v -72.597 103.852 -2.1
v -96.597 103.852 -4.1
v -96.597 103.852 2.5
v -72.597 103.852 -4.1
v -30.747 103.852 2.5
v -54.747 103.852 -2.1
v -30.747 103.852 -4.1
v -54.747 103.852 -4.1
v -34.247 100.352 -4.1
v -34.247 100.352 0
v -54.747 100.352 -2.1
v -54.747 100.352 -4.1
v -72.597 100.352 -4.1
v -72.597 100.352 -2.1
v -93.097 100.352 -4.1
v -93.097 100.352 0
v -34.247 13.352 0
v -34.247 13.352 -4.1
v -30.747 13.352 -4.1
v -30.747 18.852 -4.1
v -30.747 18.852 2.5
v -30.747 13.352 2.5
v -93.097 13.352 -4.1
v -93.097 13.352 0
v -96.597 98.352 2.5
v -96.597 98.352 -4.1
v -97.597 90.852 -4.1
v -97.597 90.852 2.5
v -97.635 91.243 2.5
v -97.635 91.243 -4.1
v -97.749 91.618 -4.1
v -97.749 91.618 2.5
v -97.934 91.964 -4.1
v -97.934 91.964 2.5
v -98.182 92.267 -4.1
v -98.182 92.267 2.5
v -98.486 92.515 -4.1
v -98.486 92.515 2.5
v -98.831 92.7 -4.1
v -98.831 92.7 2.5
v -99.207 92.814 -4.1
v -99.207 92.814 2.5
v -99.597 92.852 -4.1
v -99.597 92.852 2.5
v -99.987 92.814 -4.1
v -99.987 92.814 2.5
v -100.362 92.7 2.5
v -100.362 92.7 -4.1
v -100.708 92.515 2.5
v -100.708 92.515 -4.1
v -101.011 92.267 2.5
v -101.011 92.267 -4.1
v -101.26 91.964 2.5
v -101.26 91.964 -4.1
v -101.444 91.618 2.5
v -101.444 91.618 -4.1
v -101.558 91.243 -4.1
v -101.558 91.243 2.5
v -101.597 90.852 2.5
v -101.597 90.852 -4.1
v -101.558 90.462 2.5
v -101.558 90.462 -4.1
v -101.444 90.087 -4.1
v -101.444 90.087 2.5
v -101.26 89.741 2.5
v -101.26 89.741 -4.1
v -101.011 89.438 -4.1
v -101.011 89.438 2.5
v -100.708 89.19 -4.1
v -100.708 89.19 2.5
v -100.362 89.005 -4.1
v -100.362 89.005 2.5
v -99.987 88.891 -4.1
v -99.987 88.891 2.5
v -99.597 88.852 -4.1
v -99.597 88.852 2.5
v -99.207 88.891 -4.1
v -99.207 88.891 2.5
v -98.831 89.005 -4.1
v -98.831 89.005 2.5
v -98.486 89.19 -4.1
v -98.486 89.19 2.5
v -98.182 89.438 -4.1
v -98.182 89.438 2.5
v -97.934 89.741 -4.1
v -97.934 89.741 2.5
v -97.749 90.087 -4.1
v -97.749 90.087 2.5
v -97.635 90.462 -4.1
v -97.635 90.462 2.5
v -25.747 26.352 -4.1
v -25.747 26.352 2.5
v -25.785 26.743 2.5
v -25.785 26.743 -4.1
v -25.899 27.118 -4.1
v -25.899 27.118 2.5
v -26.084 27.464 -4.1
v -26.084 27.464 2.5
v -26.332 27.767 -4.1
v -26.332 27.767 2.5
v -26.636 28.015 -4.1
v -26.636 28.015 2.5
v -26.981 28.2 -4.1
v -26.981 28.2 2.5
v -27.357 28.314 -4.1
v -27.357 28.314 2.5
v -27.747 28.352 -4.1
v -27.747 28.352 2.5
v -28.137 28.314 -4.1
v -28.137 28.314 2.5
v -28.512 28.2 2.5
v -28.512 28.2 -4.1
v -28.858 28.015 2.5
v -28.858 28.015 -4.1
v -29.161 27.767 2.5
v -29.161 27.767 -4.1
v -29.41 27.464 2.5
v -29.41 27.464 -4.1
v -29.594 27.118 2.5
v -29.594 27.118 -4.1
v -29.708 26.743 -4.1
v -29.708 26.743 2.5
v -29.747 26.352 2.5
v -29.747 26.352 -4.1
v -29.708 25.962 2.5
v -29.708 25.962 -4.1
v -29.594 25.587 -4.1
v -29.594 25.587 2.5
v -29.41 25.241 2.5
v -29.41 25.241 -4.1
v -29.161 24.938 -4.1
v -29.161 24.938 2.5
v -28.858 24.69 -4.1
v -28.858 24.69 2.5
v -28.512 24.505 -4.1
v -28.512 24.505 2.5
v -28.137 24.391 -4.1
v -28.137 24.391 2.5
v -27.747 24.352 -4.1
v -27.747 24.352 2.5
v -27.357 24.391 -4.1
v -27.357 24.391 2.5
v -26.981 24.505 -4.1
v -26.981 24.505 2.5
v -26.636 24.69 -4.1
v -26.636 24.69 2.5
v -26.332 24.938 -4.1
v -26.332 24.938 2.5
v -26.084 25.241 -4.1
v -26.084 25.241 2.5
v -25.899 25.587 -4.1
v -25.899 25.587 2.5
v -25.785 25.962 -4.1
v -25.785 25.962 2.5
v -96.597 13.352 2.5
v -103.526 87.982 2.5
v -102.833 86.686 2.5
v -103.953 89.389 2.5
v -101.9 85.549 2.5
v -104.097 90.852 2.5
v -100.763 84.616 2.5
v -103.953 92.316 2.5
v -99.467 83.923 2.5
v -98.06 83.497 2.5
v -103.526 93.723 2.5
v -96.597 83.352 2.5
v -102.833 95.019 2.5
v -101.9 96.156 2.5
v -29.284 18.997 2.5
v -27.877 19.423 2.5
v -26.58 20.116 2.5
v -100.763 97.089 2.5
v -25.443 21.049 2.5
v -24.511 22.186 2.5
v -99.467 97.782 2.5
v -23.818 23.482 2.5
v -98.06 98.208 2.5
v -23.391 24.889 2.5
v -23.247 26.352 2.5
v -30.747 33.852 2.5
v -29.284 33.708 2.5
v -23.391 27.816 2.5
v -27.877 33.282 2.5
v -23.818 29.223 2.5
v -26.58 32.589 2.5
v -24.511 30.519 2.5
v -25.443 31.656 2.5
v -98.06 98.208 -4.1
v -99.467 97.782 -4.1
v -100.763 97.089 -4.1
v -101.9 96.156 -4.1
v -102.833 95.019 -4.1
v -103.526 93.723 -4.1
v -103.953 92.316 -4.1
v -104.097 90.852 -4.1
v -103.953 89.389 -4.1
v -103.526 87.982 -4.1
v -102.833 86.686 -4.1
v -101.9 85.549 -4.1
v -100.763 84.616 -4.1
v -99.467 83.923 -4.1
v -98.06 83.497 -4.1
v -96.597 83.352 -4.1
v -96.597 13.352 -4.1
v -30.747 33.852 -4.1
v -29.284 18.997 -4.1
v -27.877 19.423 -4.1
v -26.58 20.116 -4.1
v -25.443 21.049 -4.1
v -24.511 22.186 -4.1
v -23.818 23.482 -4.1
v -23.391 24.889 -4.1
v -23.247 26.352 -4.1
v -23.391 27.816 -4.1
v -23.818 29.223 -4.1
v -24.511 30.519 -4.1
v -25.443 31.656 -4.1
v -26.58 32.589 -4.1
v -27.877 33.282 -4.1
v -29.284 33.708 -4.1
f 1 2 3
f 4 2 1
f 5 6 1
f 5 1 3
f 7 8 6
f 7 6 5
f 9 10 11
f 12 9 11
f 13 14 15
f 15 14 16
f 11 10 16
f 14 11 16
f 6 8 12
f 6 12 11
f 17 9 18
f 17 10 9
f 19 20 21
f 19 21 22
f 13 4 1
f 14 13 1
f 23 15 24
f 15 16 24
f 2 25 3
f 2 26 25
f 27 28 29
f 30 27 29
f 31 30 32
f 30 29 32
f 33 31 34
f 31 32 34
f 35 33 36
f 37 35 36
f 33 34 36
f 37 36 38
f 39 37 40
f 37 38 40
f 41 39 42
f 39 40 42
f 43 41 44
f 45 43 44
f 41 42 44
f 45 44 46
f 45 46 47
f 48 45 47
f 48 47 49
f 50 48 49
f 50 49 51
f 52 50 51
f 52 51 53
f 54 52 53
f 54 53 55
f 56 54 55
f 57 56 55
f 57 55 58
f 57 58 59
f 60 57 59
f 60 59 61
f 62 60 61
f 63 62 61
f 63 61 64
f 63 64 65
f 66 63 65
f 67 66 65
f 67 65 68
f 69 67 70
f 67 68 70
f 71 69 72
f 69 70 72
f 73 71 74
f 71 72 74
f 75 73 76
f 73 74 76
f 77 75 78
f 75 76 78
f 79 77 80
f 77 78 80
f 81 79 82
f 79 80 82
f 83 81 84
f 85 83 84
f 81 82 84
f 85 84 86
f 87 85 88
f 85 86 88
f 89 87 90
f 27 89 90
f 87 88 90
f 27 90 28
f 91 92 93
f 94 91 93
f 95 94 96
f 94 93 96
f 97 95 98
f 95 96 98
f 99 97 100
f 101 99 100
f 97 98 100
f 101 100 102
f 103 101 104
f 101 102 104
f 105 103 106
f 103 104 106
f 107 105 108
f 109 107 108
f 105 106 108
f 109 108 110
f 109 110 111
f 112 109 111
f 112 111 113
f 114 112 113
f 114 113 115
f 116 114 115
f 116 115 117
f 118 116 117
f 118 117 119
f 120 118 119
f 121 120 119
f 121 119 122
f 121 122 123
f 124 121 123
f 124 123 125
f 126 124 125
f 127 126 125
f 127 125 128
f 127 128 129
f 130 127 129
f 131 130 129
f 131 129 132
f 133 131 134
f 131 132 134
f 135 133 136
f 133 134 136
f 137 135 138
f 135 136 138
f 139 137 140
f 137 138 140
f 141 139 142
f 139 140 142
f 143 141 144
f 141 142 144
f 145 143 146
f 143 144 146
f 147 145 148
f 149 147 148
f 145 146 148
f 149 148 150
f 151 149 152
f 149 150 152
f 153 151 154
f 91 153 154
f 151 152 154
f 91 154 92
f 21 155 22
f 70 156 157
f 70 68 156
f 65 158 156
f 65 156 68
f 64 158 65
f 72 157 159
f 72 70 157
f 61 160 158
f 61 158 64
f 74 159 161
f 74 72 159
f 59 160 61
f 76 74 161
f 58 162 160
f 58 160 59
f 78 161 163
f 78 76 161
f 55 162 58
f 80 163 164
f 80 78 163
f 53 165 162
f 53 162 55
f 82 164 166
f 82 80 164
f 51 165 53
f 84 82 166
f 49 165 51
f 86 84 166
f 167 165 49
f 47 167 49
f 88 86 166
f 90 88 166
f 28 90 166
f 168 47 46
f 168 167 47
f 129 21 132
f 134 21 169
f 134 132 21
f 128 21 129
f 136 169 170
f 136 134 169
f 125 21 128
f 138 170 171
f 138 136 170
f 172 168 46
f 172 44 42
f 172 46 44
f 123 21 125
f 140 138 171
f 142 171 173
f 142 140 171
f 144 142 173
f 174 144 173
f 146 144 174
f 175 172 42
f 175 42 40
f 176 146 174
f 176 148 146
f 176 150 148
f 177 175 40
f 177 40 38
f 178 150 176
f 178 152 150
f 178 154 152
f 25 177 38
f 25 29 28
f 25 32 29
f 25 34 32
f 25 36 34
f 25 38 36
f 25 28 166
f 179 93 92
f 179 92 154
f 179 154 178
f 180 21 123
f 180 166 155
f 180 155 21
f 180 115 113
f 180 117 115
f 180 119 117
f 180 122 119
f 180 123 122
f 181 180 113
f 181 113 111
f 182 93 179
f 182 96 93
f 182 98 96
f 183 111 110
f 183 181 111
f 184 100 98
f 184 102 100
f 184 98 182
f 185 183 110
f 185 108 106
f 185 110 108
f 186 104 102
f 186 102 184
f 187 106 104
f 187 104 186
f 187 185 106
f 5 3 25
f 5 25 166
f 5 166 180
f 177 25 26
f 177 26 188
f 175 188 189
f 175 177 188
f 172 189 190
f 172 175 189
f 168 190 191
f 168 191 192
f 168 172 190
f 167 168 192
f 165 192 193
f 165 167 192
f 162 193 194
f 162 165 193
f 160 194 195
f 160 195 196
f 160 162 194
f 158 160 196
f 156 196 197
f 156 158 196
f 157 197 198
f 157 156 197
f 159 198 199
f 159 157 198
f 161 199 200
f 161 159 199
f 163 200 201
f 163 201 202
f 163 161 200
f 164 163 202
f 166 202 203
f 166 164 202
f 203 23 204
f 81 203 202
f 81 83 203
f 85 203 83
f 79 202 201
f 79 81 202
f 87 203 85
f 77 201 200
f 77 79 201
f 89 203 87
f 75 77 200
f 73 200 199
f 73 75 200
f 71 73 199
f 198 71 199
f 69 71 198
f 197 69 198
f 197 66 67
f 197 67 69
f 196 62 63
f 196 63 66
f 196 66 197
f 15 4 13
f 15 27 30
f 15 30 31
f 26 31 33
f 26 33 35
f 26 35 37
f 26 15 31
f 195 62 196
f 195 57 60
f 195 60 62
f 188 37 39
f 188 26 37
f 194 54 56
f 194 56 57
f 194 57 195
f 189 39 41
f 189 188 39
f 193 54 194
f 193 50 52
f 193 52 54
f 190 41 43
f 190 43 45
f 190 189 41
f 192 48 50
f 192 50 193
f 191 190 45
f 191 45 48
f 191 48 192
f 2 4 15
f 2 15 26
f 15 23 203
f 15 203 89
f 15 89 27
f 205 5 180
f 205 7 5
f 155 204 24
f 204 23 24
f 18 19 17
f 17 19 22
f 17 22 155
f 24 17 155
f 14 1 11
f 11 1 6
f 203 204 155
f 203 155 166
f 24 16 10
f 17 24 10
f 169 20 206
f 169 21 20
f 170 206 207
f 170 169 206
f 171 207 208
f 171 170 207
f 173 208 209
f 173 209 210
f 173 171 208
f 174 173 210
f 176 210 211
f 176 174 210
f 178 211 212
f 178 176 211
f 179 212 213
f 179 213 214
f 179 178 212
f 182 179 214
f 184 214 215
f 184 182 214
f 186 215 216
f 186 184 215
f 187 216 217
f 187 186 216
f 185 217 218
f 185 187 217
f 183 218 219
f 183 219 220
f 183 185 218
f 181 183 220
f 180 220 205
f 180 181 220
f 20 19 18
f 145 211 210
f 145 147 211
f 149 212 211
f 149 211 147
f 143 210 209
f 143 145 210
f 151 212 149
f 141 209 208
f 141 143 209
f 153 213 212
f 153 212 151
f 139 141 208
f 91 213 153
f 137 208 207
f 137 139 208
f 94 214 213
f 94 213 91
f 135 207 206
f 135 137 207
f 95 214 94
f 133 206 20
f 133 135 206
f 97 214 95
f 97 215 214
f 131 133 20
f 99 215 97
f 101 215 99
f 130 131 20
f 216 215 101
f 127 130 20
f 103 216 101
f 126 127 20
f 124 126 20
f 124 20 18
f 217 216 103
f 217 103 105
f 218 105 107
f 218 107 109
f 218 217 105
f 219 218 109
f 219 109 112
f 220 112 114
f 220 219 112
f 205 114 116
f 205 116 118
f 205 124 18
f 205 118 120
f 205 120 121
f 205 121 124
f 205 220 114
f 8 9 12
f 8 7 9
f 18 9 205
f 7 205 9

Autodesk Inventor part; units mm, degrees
ref_plane "YZ Plane" through (0, 0, 0) normal (1, 0, 0) x (0, 1, 0)
ref_plane "XZ Plane" through (0, 0, 0) normal (0, 1, 0) x (-1, 0, 0)
ref_plane "XY Plane" through (0, 0, 0) normal (0, 0, 1) x (1, 0, 0)
sketch "Skizze1" plane through (0, 0, 0) normal (0, 0, 1) x (1, 0, 0)
  line L0 (-34.2467, 13.3525) -> (-93.0967, 13.3525)
  line L1 (-93.0967, 13.3525) -> (-93.0967, 100.3525)
  line L2 (-93.0967, 100.3525) -> (-34.2467, 100.3525)
  line L3 (-34.2467, 100.3525) -> (-34.2467, 13.3525)
  point P0 (0, 0)
  dimension "d0" = 58.85
  dimension "d1" = 87
extrude "Extrusion1" add sketch "Skizze1" along normal blind 3.5
sketch "Skizze2" plane through (0, 0, 3.5) normal (0, 0, 1) x (1, 0, 0)
  line L0 (-93.0967, 13.3525) -> (-34.2467, 13.3525) projected
  line L1 (-93.0967, 13.3525) -> (-96.5967, 13.3525)
  line L2 (-96.5967, 13.3525) -> (-96.5967, 103.8525)
  line L3 (-96.5967, 103.8525) -> (-30.7467, 103.8525)
  line L4 (-34.2467, 100.3525) -> (-93.0967, 100.3525) projected
  line L5 (-30.7467, 103.8525) -> (-30.7467, 13.3525)
  line L6 (-30.7467, 13.3525) -> (-34.2467, 13.3525)
  line L7 (-34.2467, 13.3525) -> (-34.2467, 100.3525) projected
  line L8 (-34.2467, 13.3525) -> (-34.2467, 100.3525)
  line L9 (-34.2467, 100.3525) -> (-93.0967, 100.3525)
  line L10 (-93.0967, 100.3525) -> (-93.0967, 13.3525)
  line L11 (-30.7467, 13.3525) -> (-30.7467, 9.8525)
  line L12 (-30.7467, 9.8525) -> (-96.5967, 9.8525)
  line L13 (-96.5967, 9.8525) -> (-96.5967, 13.3525)
  line L14 (-30.7467, 13.3525) -> (-96.5967, 13.3525)
  point P0 (0, 0)
  dimension "d4" = 3.5
  dimension "d5" = 3.5
  dimension "d6" = 3.5
  dimension "d7" = 3.5
extrude "Extrusion2" add sketch "Skizze2" against normal blind 5.6 contours L0 L6 L11 L12 L13 L1
sketch "Skizze3" plane through (0, 0, 0) normal (0, 0, -1) x (-1, 0, 0)
  line L0 (30.7467, 15.473) -> (30.7467, 103.8525)
  line L1 (30.7467, 103.8525) -> (96.5967, 103.8525)
  line L2 (34.2467, 100.3525) -> (93.0967, 100.3525) projected
  line L3 (96.5967, 103.8525) -> (96.5967, 13.3525)
  line L4 (93.0967, 100.3525) -> (93.0967, 13.3525) projected
  line L5 (34.2467, 100.3525) -> (34.2467, 13.3525) projected
  line L6 (30.7467, 13.3525) -> (30.7467, 15.473)
  line L7 (30.7467, 13.3525) -> (34.2467, 13.3525) projected
  line L8 (30.7467, 13.3525) -> (34.2467, 13.3525)
  line L9 (34.2467, 13.3525) -> (34.2467, 100.3525) projected
  line L10 (34.2467, 13.3525) -> (34.2467, 100.3525)
  line L11 (34.2467, 100.3525) -> (93.0967, 100.3525)
  line L12 (34.2467, 13.3525) -> (93.0967, 13.3525) projected
  line L13 (93.0967, 13.3525) -> (96.5967, 13.3525) projected
  line L14 (93.0967, 13.3525) -> (96.5967, 13.3525)
  line L15 (96.5967, 13.3525) -> (96.5967, 103.8525)
  point P0 (0, 0)
  dimension "d10" = 3.5
  dimension "d11" = 3.5
  dimension "d12" = 3.5
extrude "Extrusion3" add sketch "Skizze3" along normal blind 4.1 contours L0 L1 L3 L13 L4 L2 L5 L7 L6
sketch "Skizze4" plane through (0, 0, 0) normal (0, 0, 1) x (1, 0, 0)
  line L0 (-34.2467, 13.3525) -> (-93.0967, 13.3525) projected
  line L1 (-96.5967, 9.8525) -> (-96.5967, 13.3525) projected
  line L2 (-93.0967, 13.3525) -> (-96.5967, 13.3525)
  line L3 (-96.5967, 103.8525) -> (-30.7467, 103.8525) projected
  line L4 (-96.5967, 13.3525) -> (-96.5967, 103.8525)
  line L5 (-96.5967, 103.8525) -> (-30.7467, 103.8525)
  line L6 (-30.7467, 103.8525) -> (-30.7467, 13.3525) projected
  line L7 (-30.7467, 103.8525) -> (-30.7467, 13.3525)
  line L8 (-34.2467, 100.3525) -> (-34.2467, 13.3525) projected
  line L9 (-30.7467, 13.3525) -> (-34.2467, 13.3525)
  line L10 (-34.2467, 100.3525) -> (-93.0967, 100.3525) projected
  line L11 (-34.2467, 13.3525) -> (-34.2467, 100.3525)
  line L12 (-34.2467, 100.3525) -> (-93.0967, 100.3525)
  line L13 (-93.0967, 100.3525) -> (-93.0967, 13.3525)
  point P0 (0, 0)
extrude "Extrusion4" add sketch "Skizze4" along normal blind 3.5 contours L8 L10 L13 L2 L4 L3 L6 L9
sketch "Skizze5" plane through (-96.5967, 103.8525, -4.1) normal (0, 1, 0) x (1, 0, 0)
  line L0 (62.35, 0) -> (3.5, 0) projected
  line L1 (24.85, 0) -> (41.85, 0)
  line L2 (41.85, 0) -> (41.85, -2)
  line L3 (41.85, -2) -> (24.85, -2)
  line L4 (24.85, -2) -> (24.85, 0)
  line L5 (65.85, -7.6) -> (65.85, 0) projected
  line L6 (0, -7.6) -> (0, 0) projected
  point P0 (96.5967, -4.1)
  dimension "d17" = 17
  dimension "d18" = 24
  dimension "d19" = 2
  dimension "d40" = 24.85
extrude "Extrusion5" cut sketch "Skizze5" against normal blind 3.5
sketch "Skizze7" plane through (0, 0, -4.1) normal (0, 0, -1) x (-1, 0, 0)
  line L0 (30.7467, 9.8525) -> (30.7467, 103.8525) projected
  line L1 (30.7467, 9.8525) -> (96.5967, 9.8525) projected
  line L2 (96.5967, 13.3525) -> (96.5967, 103.8525) projected
  arc A0 (96.5967, 83.3525) -> (96.5967, 98.3525) centre (96.5967, 90.8525) ccw
  line L3 (96.5967, 103.8525) -> (71.7467, 103.8525) projected
  point P0 (0, 0)
  point P1 (30.7467, 15.3525)
  point P2 (30.7467, 30.3525)
  dimension "d24" = 15
  dimension "d25" = 13
sketch "Skizze8" plane through (-30.7467, 9.8525, 3.5) normal (1, 0, 0) x (0, 0, -1)
  point P0 (3.5, -9.8525)
extrude "Extrusion6" [suppressed]
sketch "Skizze9" plane through (0, 0, -4.1) normal (0, 0, -1) x (-1, 0, 0)
  circle A0 centre (27.7467, 22.8525) radius 2
  line L0 (30.7467, 103.8525) -> (30.7467, 13.3525) projected
  point P0 (0, 0)
  point P1 (30.7467, 22.8525)
  point P2 (30.7467, 15.3525)
  dimension "d28" = 7.5
  dimension "d29" = 4
  dimension "d30" = 3
extrude "Extrusion7" cut sketch "Skizze9" against normal through all
sketch "Skizze10" plane through (0, 0, -4.1) normal (0, 0, -1) x (-1, 0, 0)
  circle A0 centre (99.5967, 90.8525) radius 2
  line L0 (96.5967, 13.3525) -> (96.5967, 103.8525) projected
  point P0 (0, 0)
  point P1 (96.5967, 98.3525)
  dimension "d33" = 4
  dimension "d34" = 3
extrude "Extrusion8" cut sketch "Skizze10" against normal through all
sketch "Skizze11" plane through (0, 0, 3.5) normal (0, 0, 1) x (1, 0, 0)
  point P0 (0, 0)
sketch "Skizze12" plane through (-30.7467, 9.8525, 3.5) normal (1, 0, 0) x (0, 0, -1)
  line L0 (7.6, 3.5) -> (7.6, 94) projected
  line L1 (7.6, 3.5) -> (0, 3.5)
  line L2 (0, 3.5) -> (0, 0)
  line L3 (0, 0) -> (7.6, 0)
  line L4 (7.6, 0) -> (7.6, 3.5)
  point P0 (3.5, -9.8525)
extrude "Extrusion9" cut sketch "Skizze12" against normal through all
sketch "Skizze13" plane through (-30.7467, 13.3525, 3.5) normal (1, 0, 0) x (0, 0, -1)
  line L0 (7.6, 87) -> (7.6, 0) projected
  line L1 (7.6, 0) -> (5.1687, 0)
  line L2 (5.1687, 0) -> (5.1687, 2.037)
  line L3 (5.1687, 2.037) -> (7.6, 2.037)
  line L4 (7.6, 2.037) -> (7.6, 0)
  point P0 (3.5, -13.3525)
sketch "Skizze14" plane through (0, 0, 3.5) normal (0, 0, 1) x (1, 0, 0)
  line L0 (-30.7467, 103.8525) -> (-30.7467, 13.3525) projected
  arc A0 (-30.7467, 18.8525) -> (-30.7467, 33.8525) centre (-30.7467, 26.3525) ccw
  line L1 (-96.5967, 103.8525) -> (-96.5967, 13.3525) projected
  arc A1 (-96.5967, 98.3525) -> (-96.5967, 83.3525) centre (-96.5967, 90.8525) ccw
  line L2 (-96.5967, 13.3525) -> (-30.7467, 13.3525) projected
  circle A2 centre (-27.7467, 26.3525) radius 2
  circle A3 centre (-99.5967, 90.8525) radius 2
  point P0 (0, 0)
  dimension "d41" = 15
  dimension "d42" = 15
  dimension "d43" = 13
  dimension "d44" = 13
  dimension "d45" = 3
  dimension "d46" = 4
  dimension "d47" = 3
  dimension "d48" = 4
sketch "Skizze15" plane through (-96.5967, 13.3525, 3.5) normal (-1, 0, 0) x (0, 0, 1)
  point P0 (-3.5, -13.3525)
extrude "Extrusion10" add sketch "Skizze14" against normal blind 7.6
sketch "Skizze16" plane through (-93.0967, 13.3525, 0) normal (0, -1, 0) x (1, 0, 0)
  point P0 (93.0967, 0)
sketch "Skizze17" plane through (0, 0, 3.5) normal (0, 0, 1) x (1, 0, 0)
  line L0 (-13.2494, 3.641) -> (-122.0727, 3.641)
  line L1 (-122.0727, 3.641) -> (-122.0727, 119.9278)
  line L2 (-122.0727, 119.9278) -> (-13.2494, 119.9278)
  line L3 (-13.2494, 119.9278) -> (-13.2494, 3.641)
  point P0 (0, 0)
extrude "Extrusion11" cut sketch "Skizze17" against normal blind 1
sketch "Skizze18" plane through (0, 0, 0) normal (0, 0, -1) x (-1, 0, 0)
  point P0 (0, 0)
ref_plane "Arbeitsebene1" through (-96.5967, 103.8525, -4.1) normal (0, 1, 0) x (1, 0, 0)
sketch "Skizze19" plane through (-96.5967, 103.8525, -4.1) normal (0, 1, 0) x (1, 0, 0)
  line L0 (0, -6.6) -> (0, 0) projected
  line L1 (0, 0) -> (24.85, 0) projected
  line L2 (0, -6.6) -> (65.85, -6.6) projected
  line L3 (65.85, -6.6) -> (65.85, 0) projected
  line L4 (41.85, 0) -> (65.85, 0) projected
  line L5 (24, -2) -> (41.85, -2)
  line L6 (41.85, -2) -> (41.85, 5.2977)
  line L7 (41.85, 5.2977) -> (24, 5.2977)
  line L8 (24, 5.2977) -> (24, -2)
  point P0 (96.5967, -4.1)
  dimension "d54" = 24
  dimension "d55" = 24
  dimension "d56" = 2
extrude "Extrusion12" cut sketch "Skizze19" against normal blind 10 contours L8 L7 L6 L5
properties part number "Unterteil_fertig2"
